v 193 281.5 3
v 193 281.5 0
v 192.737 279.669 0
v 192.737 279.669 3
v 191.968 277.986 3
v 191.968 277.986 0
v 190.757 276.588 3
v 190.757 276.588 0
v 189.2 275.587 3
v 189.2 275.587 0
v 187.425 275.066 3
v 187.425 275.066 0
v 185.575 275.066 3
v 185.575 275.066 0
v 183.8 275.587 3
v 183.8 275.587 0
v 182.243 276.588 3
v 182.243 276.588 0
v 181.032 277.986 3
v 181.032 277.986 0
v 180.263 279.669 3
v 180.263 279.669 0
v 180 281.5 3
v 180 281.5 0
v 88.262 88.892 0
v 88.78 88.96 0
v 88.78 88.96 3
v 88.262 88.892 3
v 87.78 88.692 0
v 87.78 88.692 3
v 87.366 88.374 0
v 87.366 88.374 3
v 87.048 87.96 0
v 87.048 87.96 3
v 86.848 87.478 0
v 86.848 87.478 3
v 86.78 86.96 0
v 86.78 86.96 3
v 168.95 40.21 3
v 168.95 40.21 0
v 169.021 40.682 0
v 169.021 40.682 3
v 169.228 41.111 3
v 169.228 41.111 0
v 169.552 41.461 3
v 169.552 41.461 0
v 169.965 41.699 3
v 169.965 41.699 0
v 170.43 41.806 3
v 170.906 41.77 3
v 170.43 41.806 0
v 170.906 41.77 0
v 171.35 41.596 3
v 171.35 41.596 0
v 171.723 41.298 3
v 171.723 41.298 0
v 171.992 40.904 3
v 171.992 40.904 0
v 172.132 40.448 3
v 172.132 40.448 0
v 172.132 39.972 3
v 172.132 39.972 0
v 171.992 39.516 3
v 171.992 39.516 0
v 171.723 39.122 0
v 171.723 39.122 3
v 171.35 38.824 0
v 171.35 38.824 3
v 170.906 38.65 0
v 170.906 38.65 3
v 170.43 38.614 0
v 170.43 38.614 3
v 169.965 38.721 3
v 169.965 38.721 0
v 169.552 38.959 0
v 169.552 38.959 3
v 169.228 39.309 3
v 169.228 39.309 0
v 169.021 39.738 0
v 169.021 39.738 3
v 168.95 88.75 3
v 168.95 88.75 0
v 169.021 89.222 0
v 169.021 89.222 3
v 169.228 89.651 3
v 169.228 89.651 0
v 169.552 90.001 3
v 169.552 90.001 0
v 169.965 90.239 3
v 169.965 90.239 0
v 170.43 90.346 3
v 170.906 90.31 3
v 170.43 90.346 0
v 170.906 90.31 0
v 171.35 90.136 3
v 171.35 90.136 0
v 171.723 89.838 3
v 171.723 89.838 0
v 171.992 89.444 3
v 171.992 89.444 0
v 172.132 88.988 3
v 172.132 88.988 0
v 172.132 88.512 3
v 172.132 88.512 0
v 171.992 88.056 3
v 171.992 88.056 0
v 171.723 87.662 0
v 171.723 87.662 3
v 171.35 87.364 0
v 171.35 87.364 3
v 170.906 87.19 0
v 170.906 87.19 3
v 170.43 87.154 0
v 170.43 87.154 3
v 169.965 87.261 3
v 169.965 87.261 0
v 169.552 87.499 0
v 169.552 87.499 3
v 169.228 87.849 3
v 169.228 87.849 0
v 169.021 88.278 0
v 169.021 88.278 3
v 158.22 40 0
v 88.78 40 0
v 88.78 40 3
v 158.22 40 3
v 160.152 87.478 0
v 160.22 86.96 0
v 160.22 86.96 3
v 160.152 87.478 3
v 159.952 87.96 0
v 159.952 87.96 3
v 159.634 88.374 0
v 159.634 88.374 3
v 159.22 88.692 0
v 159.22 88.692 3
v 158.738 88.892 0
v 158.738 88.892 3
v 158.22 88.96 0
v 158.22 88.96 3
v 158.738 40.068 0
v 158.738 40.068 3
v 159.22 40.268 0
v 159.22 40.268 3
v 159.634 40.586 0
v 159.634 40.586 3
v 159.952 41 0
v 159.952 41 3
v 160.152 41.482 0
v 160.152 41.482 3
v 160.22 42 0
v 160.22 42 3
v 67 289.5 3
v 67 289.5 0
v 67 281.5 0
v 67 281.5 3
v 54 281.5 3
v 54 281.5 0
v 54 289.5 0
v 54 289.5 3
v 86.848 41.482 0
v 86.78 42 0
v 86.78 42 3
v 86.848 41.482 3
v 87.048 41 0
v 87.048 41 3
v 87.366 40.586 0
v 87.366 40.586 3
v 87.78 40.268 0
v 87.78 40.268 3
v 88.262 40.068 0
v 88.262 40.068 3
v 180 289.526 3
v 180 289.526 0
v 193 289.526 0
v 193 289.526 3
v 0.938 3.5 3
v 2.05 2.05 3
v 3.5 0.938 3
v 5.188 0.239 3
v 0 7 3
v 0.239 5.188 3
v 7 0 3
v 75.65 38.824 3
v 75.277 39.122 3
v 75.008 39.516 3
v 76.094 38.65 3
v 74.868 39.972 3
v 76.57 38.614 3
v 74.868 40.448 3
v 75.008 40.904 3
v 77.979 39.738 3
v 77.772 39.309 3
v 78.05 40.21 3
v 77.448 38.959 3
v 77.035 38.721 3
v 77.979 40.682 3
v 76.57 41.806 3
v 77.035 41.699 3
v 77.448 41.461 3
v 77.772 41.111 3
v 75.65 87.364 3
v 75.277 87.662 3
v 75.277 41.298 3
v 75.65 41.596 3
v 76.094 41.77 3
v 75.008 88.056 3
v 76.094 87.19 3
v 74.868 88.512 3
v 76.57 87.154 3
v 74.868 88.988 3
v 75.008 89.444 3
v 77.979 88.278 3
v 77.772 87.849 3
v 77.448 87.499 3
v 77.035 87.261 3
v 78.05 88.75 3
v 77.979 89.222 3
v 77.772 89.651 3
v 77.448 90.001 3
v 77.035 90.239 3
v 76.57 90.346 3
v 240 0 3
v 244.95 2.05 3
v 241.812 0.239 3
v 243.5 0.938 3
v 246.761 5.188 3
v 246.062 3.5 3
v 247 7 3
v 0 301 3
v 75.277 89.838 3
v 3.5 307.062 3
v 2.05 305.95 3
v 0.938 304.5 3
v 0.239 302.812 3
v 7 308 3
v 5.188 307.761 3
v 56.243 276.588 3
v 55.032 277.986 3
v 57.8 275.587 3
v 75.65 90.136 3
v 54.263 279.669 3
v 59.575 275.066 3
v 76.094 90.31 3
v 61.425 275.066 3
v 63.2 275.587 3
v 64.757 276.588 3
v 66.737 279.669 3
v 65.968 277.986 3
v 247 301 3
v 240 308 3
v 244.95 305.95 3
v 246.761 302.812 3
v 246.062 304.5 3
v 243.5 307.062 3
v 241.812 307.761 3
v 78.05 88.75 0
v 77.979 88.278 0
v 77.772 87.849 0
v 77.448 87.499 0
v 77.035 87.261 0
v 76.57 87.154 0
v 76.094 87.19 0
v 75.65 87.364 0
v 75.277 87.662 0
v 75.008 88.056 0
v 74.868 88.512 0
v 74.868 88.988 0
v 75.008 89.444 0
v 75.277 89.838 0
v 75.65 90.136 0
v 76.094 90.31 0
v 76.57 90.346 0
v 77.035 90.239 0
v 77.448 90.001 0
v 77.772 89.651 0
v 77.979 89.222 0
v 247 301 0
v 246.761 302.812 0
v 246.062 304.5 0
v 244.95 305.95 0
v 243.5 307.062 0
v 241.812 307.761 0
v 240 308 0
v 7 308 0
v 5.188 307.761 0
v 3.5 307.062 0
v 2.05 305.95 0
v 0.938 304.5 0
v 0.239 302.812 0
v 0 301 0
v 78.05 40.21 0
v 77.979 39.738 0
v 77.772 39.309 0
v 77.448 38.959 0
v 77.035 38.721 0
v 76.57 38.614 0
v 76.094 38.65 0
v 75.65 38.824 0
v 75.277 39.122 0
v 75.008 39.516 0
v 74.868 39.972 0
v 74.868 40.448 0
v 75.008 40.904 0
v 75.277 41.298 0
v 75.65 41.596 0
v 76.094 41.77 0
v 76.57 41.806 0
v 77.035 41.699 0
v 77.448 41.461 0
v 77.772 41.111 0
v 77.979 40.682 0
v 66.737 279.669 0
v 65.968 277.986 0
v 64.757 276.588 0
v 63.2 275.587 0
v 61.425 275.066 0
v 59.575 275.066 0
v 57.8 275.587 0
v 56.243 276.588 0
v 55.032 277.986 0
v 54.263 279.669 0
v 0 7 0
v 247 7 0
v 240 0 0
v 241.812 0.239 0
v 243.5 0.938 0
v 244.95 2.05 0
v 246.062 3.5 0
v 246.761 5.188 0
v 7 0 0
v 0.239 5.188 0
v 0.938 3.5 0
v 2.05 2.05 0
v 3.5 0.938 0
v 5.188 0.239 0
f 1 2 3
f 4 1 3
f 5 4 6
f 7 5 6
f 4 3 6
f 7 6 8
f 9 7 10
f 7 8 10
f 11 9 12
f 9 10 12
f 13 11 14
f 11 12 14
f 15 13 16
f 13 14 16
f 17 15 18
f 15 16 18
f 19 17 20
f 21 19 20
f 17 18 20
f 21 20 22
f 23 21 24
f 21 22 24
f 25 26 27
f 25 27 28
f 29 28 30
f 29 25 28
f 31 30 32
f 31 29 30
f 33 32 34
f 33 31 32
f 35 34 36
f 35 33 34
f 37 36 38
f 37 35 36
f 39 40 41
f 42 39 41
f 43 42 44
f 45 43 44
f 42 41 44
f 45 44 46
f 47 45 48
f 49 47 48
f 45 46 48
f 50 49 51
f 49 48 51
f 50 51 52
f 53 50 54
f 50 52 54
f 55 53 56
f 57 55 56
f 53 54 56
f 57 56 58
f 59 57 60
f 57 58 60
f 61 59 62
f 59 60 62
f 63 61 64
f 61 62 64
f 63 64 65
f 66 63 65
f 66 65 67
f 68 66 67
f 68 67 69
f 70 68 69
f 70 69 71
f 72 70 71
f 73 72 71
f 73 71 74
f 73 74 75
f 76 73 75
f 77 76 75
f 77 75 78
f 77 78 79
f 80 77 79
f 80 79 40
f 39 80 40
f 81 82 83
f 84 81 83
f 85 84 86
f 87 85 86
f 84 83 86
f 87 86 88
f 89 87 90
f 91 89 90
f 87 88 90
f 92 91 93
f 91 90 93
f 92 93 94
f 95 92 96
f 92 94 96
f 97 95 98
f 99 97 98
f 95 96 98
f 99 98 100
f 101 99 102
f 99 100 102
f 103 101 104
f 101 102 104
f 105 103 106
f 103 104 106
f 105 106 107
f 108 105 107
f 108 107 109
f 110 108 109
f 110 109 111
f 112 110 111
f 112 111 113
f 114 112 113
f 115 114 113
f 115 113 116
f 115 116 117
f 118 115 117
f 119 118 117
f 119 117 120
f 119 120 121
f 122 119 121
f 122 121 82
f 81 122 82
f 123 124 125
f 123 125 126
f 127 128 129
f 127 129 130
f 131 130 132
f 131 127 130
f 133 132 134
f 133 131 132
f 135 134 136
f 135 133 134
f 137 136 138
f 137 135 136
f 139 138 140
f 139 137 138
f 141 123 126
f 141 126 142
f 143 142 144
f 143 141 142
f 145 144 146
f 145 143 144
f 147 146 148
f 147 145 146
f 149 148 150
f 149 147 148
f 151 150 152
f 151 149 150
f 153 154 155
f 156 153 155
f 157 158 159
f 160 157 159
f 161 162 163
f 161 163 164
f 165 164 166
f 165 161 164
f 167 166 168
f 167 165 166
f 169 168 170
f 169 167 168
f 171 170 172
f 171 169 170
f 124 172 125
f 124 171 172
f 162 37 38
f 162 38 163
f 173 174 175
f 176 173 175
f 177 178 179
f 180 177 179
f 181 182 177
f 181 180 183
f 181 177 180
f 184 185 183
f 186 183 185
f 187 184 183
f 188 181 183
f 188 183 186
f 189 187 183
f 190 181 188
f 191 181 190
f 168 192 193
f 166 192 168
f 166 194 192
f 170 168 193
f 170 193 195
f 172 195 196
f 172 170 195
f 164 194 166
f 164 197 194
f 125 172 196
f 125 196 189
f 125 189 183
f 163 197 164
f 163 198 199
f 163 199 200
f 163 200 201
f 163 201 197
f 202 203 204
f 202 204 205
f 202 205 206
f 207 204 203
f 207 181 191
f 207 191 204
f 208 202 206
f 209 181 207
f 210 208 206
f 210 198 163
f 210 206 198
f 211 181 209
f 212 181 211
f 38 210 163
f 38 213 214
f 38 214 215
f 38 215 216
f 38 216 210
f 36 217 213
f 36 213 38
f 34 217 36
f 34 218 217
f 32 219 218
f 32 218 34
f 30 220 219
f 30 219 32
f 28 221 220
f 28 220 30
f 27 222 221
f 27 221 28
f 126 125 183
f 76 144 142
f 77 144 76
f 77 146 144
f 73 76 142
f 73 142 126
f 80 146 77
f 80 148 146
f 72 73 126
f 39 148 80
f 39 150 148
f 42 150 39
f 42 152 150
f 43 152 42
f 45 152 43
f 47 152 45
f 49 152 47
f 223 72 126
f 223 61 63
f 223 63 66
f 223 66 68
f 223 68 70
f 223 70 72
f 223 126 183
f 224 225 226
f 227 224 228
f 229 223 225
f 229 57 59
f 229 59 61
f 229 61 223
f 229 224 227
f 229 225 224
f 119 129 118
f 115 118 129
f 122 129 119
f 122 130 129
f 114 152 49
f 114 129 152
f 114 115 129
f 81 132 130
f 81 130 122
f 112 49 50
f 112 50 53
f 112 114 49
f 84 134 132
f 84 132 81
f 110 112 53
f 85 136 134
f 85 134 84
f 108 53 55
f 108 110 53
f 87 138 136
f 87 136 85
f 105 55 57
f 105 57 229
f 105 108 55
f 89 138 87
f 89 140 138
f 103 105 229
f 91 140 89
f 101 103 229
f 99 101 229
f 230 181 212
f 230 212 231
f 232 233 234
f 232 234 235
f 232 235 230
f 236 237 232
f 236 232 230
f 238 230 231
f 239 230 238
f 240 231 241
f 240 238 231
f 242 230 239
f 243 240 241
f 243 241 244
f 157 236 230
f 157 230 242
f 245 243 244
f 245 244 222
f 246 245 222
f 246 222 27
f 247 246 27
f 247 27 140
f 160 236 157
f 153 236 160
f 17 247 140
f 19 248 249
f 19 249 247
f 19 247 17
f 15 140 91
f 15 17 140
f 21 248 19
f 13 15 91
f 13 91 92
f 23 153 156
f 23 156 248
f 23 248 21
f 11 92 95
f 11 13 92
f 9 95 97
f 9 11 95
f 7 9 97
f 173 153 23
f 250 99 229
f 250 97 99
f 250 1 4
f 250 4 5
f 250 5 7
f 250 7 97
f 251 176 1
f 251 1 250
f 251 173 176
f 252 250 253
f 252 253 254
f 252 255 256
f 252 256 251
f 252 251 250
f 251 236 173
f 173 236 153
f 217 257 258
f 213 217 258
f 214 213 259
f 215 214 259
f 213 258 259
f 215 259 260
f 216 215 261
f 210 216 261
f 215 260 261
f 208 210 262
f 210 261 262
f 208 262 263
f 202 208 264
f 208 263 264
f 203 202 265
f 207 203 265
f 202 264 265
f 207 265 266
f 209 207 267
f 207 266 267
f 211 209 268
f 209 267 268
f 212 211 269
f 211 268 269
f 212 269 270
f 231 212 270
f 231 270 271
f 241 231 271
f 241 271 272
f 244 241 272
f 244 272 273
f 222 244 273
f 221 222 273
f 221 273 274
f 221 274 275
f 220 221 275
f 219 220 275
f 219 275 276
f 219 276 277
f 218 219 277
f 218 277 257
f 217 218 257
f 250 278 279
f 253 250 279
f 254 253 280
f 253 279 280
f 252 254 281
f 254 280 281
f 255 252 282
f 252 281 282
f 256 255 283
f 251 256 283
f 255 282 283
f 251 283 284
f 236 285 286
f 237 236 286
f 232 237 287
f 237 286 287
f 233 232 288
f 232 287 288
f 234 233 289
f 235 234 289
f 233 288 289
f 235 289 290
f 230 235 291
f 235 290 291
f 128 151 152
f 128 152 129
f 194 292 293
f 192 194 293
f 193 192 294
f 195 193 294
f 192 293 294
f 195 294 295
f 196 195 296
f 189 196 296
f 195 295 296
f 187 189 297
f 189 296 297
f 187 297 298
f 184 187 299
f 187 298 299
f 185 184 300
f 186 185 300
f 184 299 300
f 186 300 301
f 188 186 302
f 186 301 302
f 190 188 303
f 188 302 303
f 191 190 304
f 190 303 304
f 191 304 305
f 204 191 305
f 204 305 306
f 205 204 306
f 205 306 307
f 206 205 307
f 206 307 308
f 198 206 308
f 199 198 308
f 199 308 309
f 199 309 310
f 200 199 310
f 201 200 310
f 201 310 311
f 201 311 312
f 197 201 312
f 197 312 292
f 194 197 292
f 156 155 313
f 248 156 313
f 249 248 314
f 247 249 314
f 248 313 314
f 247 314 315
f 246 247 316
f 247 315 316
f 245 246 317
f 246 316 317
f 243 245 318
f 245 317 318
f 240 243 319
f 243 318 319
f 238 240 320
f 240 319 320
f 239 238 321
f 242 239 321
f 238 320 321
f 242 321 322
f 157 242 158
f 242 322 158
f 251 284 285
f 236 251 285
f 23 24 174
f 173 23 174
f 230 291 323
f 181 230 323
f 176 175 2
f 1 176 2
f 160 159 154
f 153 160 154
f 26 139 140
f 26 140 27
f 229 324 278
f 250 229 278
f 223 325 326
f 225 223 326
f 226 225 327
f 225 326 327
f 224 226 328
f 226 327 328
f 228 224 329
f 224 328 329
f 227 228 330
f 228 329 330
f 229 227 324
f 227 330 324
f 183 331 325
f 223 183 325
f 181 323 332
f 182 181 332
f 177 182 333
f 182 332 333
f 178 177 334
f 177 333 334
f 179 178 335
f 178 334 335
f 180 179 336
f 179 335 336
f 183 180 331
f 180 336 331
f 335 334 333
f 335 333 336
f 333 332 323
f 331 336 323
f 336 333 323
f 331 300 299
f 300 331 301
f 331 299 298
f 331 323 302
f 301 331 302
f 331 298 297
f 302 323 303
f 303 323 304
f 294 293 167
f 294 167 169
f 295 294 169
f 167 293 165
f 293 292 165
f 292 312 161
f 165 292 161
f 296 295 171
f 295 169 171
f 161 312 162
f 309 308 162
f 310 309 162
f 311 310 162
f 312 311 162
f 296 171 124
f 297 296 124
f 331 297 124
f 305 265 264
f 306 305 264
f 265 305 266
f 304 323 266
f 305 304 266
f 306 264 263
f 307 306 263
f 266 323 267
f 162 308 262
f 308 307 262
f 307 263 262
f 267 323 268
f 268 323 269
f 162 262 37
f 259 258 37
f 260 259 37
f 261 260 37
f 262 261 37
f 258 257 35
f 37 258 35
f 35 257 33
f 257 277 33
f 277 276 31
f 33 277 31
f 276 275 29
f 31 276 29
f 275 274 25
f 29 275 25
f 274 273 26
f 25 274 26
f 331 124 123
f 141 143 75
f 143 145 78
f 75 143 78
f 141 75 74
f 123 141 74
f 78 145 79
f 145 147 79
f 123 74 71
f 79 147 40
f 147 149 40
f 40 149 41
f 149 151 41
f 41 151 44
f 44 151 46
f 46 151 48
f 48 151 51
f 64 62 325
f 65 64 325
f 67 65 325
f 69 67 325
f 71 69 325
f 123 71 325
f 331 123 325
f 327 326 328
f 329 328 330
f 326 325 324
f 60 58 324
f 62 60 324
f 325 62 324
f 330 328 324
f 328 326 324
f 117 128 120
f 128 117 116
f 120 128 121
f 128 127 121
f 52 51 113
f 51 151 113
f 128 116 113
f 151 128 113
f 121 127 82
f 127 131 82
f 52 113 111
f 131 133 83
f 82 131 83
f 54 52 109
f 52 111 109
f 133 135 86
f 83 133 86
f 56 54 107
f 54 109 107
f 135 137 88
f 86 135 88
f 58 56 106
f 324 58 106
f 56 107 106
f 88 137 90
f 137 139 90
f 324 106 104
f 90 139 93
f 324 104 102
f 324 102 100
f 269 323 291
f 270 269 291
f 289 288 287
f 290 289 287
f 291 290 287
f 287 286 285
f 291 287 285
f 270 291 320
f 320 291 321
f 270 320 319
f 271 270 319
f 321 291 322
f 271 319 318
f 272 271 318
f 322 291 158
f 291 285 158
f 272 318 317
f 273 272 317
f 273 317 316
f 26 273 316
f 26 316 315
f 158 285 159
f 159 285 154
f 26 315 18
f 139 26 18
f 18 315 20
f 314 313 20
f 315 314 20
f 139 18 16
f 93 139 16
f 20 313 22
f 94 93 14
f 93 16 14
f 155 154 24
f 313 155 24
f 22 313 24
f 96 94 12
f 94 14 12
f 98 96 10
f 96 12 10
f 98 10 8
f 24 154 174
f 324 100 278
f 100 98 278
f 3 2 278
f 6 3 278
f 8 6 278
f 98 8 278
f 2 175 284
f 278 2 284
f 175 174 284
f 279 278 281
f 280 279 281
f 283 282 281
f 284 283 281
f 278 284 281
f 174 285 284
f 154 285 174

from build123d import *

# Parameters (mm, degrees)
BOSS_EXTRU_1_DEPTH      = 3
ENL_V_MAT_EXTRU_1_DEPTH = 395.818945847
ESQUISSE3_R             = 1.6
ENL_V_MAT_EXTRU_2_DEPTH = 395.818945847


with BuildPart() as part:
    # Esquisse1 → Boss.-Extru.1 (new body)
    with BuildSketch(Plane.XY):
        with BuildLine():
            Line((7, 0), (240, 0))
            ThreePointArc((240, 0), (244.949747468, 2.050252532), (247, 7))
            Line((247, 7), (247, 301))
            ThreePointArc((247, 301), (244.949747468, 305.949747468), (240, 308))
            Line((240, 308), (7, 308))
            ThreePointArc((7, 308), (2.050252532, 305.949747468), (0, 301))
            Line((0, 301), (0, 7))
            ThreePointArc((0, 7), (2.050252532, 2.050252532), (7, 0))
        make_face()
    extrude(amount=BOSS_EXTRU_1_DEPTH)

    # Esquisse2 → Enlèv. mat.-Extru.1 (cut, through all)
    with BuildSketch(Plane(origin=(0, 0, 0), x_dir=(-1, 0, 0), z_dir=(0, 0, -1))):
        with BuildLine():
            Line((-54, 289.5), (-67, 289.5))
            Line((-67, 289.5), (-67, 281.5))
            ThreePointArc((-67, 281.5), (-60.5, 275), (-54, 281.5))
            Line((-54, 281.5), (-54, 289.5))
        make_face()
        with BuildLine():
            Line((-193, 289.5), (-193, 281.5))
            ThreePointArc((-193, 281.5), (-186.5, 275), (-180, 281.5))
            Line((-180, 281.5), (-180, 289.5))
            Line((-180, 289.5), (-180, 289.526253408))
            Line((-180, 289.526253408), (-193, 289.526253408))
            Line((-193, 289.526253408), (-193, 289.5))
        make_face()
    extrude(amount=-ENL_V_MAT_EXTRU_1_DEPTH, mode=Mode.SUBTRACT)

    # Esquisse3 → Enlèv. mat.-Extru.2 (cut, through all)
    with BuildSketch(Plane(origin=(0, 0, 0), x_dir=(-1, 0, 0), z_dir=(0, 0, -1))):
        with Locations((-170.55, 88.75)):
            Circle(ESQUISSE3_R)
        with Locations(Location((-76.45, 40.21, 0), (0, 0, 180))):
            Circle(ESQUISSE3_R)
        with Locations((-170.55, 40.21)):
            Circle(ESQUISSE3_R)
        with Locations(Location((-76.45, 88.75, 0), (0, 0, 180))):
            Circle(ESQUISSE3_R)
        with BuildLine():
            Line((-158.22, 88.96), (-88.78, 88.96))
            ThreePointArc((-88.78, 88.96), (-87.365786438, 88.374213562), (-86.78, 86.96))
            Line((-86.78, 86.96), (-86.78, 42))
            ThreePointArc((-86.78, 42), (-87.365786438, 40.585786438), (-88.78, 40))
            Line((-88.78, 40), (-158.22, 40))
            ThreePointArc((-158.22, 40), (-159.634213562, 40.585786438), (-160.22, 42))
            Line((-160.22, 42), (-160.22, 86.96))
            ThreePointArc((-160.22, 86.96), (-159.634213562, 88.374213562), (-158.22, 88.96))
        make_face()
    extrude(amount=-ENL_V_MAT_EXTRU_2_DEPTH, mode=Mode.SUBTRACT)


solid = part.part
